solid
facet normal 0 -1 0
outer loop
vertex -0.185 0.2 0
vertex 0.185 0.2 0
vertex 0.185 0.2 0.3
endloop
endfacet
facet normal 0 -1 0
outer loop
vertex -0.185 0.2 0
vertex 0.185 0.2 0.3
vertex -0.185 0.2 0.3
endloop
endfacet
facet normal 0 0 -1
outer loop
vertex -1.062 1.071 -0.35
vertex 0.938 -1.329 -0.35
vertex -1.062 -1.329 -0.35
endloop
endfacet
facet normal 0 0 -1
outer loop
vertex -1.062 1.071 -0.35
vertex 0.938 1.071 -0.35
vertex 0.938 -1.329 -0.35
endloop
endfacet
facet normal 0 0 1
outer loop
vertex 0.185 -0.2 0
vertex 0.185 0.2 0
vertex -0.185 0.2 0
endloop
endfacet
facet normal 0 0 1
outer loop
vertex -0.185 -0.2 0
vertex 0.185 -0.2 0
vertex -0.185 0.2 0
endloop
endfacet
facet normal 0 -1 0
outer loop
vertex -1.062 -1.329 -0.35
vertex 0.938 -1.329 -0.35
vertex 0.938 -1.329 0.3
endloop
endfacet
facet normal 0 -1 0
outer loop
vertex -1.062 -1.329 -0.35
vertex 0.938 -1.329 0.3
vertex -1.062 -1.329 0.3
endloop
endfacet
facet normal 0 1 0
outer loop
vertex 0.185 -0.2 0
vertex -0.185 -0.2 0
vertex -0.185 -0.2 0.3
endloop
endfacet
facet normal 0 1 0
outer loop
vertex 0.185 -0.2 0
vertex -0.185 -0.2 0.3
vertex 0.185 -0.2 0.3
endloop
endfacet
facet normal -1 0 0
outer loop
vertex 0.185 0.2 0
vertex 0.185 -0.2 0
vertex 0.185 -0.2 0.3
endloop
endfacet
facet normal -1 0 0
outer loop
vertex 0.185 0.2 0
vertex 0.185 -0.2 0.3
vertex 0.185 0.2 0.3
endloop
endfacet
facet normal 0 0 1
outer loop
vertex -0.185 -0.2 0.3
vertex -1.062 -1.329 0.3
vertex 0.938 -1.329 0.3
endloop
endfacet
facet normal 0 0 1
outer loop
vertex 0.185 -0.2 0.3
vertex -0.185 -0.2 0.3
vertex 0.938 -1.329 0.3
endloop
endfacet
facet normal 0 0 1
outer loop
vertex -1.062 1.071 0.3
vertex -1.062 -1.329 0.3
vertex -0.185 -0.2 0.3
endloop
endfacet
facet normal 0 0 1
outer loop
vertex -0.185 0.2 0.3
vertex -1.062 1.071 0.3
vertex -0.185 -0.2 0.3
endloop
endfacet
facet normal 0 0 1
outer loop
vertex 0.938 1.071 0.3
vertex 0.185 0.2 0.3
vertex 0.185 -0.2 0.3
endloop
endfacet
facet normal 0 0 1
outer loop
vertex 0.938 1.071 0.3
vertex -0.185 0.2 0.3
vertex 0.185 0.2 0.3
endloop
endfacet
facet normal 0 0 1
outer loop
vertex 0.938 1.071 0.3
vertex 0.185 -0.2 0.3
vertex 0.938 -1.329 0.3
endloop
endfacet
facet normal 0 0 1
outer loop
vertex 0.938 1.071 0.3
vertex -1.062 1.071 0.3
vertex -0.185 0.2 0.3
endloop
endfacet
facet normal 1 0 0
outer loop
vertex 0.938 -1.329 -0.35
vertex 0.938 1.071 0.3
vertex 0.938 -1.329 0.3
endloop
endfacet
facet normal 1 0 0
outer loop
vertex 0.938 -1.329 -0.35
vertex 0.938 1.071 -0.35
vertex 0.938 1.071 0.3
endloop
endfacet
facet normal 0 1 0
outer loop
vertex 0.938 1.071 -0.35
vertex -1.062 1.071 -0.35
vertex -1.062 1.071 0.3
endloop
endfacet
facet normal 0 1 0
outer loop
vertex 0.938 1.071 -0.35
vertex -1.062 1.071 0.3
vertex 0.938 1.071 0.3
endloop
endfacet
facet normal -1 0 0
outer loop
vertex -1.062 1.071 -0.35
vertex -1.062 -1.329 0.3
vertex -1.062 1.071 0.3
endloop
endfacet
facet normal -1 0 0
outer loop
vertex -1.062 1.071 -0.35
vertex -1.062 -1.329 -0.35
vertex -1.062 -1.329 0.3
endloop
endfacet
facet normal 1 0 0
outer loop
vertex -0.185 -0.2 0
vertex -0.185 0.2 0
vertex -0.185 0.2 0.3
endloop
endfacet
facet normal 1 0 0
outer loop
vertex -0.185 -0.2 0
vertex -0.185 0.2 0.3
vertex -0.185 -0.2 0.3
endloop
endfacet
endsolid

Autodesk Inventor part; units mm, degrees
ref_plane "YZ Plane" through (0, 0, 0) normal (1, 0, 0) x (0, 1, 0)
ref_plane "XZ Plane" through (0, 0, 0) normal (0, 1, 0) x (-1, 0, 0)
ref_plane "XY Plane" through (0, 0, 0) normal (0, 0, 1) x (1, 0, 0)
sketch "Skizze1" plane through (0, 0, 0) normal (0, 0, 1) x (1, 0, 0)
  line L0 (-0.185, -0.2) -> (0.185, -0.2)
  line L1 (0.185, -0.2) -> (0.185, 0.2)
  line L2 (0.185, 0.2) -> (-0.185, 0.2)
  line L3 (-0.185, 0.2) -> (-0.185, -0.2)
  line L4 (-0.185, -0.2) -> (0.185, 0.2) construction
  line L5 (0.185, -0.2) -> (-0.185, 0.2) construction
  line L6 (-1.062, 1.071) -> (0.938, 1.071)
  line L7 (0.938, 1.071) -> (0.938, -1.329)
  line L8 (0.938, -1.329) -> (-1.062, -1.329)
  line L9 (-1.062, -1.329) -> (-1.062, 1.071)
  point P0 (0, 0)
  dimension "d0" = 0.37
  dimension "d1" = 0.4
  dimension "d2" = 0.877
  dimension "d3" = 0.871
  dimension "d4" = 2
  dimension "d5" = 2.4
extrude "Extrusion1" add sketch "Skizze1" along normal blind 0.3
sketch "Skizze2" plane through (0, 0, 0) normal (0, 0, -1) x (-1, 0, 0)
  line L0 (0.185, 0.2) -> (0.185, -0.2) projected
  line L1 (0.185, -0.2) -> (-0.185, -0.2) projected
  line L2 (-0.185, -0.2) -> (-0.185, 0.2) projected
  line L3 (-0.185, 0.2) -> (0.185, 0.2) projected
  line L4 (1.062, 1.071) -> (-0.938, 1.071) projected
  line L5 (-0.938, 1.071) -> (-0.938, -1.329) projected
  line L6 (-0.938, -1.329) -> (1.062, -1.329) projected
  line L7 (1.062, -1.329) -> (1.062, 1.071) projected
  line L8 (-0.938, 1.071) -> (1.062, 1.071) projected
  line L9 (1.062, -1.329) -> (-0.938, -1.329)
  line L10 (-0.938, -1.329) -> (-0.938, 1.071)
  line L11 (-0.938, 1.071) -> (1.062, 1.071)
  line L12 (1.062, 1.071) -> (1.062, -1.329)
  point P0 (0, 0)
extrude "Extrusion2" add sketch "Skizze2" along normal blind 0.35 contours L0 L1 L2 L3 | L7 L6 L5 L4
properties part number "TCS3472" material "PC/ABS-Kunststoff"
